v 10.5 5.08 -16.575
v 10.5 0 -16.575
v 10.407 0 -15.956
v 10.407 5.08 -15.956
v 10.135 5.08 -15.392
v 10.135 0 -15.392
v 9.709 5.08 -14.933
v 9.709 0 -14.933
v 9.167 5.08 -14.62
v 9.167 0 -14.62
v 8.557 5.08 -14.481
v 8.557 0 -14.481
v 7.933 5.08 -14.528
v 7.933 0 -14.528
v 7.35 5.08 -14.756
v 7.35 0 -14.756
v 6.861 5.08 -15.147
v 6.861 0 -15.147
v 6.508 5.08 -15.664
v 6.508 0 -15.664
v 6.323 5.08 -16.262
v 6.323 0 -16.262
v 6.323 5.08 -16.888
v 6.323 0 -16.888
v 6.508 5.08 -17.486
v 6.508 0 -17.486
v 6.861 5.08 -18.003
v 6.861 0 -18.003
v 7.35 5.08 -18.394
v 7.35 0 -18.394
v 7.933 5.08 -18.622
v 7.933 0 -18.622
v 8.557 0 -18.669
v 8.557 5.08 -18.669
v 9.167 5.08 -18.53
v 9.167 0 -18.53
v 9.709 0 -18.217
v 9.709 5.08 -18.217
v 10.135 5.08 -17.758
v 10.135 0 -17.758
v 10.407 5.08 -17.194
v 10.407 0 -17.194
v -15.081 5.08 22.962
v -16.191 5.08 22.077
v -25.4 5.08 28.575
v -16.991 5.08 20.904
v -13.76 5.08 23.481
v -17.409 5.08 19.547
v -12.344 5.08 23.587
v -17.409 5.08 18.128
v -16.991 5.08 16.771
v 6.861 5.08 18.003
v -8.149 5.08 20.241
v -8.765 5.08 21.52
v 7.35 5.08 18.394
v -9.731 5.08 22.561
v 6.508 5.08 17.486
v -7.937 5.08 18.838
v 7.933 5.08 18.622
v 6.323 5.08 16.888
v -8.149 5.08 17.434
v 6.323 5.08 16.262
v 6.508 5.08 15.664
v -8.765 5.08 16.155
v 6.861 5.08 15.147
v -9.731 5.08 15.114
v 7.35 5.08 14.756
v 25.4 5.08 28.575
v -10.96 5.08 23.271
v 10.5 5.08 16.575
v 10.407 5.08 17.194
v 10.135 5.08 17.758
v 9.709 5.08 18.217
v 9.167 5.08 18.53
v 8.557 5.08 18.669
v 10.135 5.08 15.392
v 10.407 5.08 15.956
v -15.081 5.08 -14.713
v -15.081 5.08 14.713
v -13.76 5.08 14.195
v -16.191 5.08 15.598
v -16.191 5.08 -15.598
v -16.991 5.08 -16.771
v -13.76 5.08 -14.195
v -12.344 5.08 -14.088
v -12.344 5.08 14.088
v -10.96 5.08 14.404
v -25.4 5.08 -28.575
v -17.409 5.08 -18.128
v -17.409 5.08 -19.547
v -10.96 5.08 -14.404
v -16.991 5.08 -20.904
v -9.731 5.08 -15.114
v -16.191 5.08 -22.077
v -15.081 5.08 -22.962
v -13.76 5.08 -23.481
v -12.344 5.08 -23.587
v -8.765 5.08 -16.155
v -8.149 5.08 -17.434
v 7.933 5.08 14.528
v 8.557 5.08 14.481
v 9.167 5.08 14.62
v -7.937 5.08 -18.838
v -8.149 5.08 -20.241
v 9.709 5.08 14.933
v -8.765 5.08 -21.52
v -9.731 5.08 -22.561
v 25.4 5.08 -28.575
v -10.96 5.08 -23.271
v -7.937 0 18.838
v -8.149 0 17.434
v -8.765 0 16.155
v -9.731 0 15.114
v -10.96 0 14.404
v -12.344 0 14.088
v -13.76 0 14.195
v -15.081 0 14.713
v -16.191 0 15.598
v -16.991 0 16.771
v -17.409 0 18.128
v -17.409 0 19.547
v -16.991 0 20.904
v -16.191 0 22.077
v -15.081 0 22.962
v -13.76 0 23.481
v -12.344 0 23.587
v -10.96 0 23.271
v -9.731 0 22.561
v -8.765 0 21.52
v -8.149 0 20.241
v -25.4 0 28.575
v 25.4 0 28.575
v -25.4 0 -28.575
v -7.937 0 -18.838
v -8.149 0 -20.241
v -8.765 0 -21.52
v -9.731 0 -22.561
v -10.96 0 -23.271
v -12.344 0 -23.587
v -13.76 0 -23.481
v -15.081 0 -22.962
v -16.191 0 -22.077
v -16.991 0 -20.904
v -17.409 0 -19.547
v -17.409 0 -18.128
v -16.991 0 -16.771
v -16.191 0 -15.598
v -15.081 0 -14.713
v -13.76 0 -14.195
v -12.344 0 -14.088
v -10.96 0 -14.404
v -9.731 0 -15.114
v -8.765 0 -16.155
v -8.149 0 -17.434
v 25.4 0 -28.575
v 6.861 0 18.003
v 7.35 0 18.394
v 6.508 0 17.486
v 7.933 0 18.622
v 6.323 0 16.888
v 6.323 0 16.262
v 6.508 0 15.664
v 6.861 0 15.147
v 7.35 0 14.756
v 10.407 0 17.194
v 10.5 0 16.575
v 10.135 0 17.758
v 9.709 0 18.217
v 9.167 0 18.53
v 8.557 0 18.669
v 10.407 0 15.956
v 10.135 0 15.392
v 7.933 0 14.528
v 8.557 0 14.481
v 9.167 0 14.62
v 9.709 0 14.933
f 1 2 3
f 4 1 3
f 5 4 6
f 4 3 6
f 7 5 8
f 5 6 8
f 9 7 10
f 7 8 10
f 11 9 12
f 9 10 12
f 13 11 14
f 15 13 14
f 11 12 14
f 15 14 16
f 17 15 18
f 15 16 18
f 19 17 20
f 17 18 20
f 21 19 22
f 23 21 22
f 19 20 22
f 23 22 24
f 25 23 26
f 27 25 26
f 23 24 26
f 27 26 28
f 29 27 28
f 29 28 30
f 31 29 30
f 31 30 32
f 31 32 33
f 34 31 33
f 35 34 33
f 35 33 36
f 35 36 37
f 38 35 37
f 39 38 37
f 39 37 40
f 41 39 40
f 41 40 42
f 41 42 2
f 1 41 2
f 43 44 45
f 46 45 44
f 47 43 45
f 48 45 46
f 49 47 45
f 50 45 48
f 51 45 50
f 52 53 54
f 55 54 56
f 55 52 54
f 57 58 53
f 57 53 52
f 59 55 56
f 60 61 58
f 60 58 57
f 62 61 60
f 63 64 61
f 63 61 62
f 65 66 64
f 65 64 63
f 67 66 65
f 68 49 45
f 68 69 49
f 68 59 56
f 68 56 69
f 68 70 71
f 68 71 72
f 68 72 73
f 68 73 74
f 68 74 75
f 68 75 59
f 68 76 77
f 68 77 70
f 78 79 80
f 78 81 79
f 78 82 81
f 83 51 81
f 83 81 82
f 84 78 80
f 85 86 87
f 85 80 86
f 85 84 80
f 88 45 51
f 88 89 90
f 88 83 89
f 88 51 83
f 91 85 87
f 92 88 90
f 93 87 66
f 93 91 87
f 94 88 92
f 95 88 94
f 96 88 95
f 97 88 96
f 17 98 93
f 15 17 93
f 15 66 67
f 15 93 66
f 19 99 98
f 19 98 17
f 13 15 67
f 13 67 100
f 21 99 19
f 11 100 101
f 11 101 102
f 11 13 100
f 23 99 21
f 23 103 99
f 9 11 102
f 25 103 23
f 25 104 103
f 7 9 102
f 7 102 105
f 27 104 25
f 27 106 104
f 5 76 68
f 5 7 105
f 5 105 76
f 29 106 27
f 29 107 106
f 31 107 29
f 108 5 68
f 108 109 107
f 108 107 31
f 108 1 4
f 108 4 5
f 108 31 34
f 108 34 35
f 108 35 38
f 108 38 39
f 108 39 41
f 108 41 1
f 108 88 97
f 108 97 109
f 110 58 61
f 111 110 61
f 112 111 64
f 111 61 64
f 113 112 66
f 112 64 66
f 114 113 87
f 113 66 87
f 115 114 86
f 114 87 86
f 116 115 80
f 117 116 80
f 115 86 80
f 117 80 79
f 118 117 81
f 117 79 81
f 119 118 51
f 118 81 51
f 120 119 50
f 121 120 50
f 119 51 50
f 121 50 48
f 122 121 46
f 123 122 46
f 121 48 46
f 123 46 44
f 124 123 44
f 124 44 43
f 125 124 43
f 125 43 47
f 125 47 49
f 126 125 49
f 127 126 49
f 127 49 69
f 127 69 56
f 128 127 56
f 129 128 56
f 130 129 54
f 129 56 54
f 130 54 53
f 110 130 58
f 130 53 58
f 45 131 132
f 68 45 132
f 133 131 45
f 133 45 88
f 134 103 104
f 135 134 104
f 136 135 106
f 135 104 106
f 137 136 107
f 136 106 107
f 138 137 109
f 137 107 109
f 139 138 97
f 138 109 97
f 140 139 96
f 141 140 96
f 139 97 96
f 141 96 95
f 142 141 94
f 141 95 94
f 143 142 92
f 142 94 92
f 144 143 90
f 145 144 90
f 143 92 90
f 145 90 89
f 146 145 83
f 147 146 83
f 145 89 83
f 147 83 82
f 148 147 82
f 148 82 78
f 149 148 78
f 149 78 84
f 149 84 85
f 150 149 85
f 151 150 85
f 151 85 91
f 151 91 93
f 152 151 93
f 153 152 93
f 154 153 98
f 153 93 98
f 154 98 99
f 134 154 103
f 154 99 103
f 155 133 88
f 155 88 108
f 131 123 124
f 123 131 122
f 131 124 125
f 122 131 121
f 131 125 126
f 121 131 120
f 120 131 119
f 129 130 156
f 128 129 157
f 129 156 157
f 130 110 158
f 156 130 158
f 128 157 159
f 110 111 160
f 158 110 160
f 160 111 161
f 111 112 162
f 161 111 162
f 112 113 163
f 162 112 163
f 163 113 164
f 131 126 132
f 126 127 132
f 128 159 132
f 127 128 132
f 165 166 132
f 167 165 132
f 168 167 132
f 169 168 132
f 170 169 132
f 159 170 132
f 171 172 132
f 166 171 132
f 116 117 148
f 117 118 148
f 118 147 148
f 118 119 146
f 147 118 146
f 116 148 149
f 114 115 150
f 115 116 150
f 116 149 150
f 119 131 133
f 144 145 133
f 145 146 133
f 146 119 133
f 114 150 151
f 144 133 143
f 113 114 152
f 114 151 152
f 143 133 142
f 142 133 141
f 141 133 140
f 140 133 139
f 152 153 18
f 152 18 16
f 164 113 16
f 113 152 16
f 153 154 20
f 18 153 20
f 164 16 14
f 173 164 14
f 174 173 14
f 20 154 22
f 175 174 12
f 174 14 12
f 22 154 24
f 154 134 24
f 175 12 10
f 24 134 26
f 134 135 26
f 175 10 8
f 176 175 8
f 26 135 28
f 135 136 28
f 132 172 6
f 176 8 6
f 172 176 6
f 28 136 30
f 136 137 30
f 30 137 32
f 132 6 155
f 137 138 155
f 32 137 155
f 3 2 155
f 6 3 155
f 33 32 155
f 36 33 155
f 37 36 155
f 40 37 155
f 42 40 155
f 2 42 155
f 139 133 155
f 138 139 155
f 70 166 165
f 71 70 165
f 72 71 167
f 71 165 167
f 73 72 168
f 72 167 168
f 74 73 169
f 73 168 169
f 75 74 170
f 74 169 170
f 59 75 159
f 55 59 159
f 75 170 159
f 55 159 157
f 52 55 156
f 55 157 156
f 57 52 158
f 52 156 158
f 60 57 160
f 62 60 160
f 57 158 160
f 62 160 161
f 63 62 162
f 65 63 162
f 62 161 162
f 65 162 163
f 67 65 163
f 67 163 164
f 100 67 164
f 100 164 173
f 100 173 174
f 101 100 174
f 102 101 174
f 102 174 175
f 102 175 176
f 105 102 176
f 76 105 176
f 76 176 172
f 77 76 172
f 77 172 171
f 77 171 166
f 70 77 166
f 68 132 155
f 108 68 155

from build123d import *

# Parameters (mm, degrees)
SKETCH1_W           = 50.8
SKETCH1_H           = 57.15
BOSS_EXTRUDE1_DEPTH = 5.08
SKETCH2_R           = 4.7625
CUT_EXTRUDE1_DEPTH  = 5.08
SKETCH3_R           = 2.1
CUT_EXTRUDE3_DEPTH  = 6.08


with BuildPart() as part:
    # Sketch1 → Boss-Extrude1 (new body)
    with BuildSketch(Plane(origin=(0, 0, 0), x_dir=(1, 0, 0), z_dir=(0, 1, 0))):
        Rectangle(SKETCH1_W, SKETCH1_H)
    extrude(amount=BOSS_EXTRUDE1_DEPTH)

    # Sketch2 → Cut-Extrude1 (cut)
    with BuildSketch(Plane(origin=(0, 5.08, 0), x_dir=(1, 0, 0), z_dir=(0, 1, 0))):
        with Locations((-12.7, 18.837656)):
            Circle(SKETCH2_R)
        with Locations((-12.7, -18.837656)):
            Circle(SKETCH2_R)
    extrude(amount=-CUT_EXTRUDE1_DEPTH, mode=Mode.SUBTRACT)

    # Sketch3 → Cut-Extrude3 (cut, through all)
    with BuildSketch(Plane.XZ):
        with Locations((8.4, -16.575)):
            Circle(SKETCH3_R)
        with Locations((8.4, 16.575)):
            Circle(SKETCH3_R)
    extrude(amount=-CUT_EXTRUDE3_DEPTH, mode=Mode.SUBTRACT)


solid = part.part
